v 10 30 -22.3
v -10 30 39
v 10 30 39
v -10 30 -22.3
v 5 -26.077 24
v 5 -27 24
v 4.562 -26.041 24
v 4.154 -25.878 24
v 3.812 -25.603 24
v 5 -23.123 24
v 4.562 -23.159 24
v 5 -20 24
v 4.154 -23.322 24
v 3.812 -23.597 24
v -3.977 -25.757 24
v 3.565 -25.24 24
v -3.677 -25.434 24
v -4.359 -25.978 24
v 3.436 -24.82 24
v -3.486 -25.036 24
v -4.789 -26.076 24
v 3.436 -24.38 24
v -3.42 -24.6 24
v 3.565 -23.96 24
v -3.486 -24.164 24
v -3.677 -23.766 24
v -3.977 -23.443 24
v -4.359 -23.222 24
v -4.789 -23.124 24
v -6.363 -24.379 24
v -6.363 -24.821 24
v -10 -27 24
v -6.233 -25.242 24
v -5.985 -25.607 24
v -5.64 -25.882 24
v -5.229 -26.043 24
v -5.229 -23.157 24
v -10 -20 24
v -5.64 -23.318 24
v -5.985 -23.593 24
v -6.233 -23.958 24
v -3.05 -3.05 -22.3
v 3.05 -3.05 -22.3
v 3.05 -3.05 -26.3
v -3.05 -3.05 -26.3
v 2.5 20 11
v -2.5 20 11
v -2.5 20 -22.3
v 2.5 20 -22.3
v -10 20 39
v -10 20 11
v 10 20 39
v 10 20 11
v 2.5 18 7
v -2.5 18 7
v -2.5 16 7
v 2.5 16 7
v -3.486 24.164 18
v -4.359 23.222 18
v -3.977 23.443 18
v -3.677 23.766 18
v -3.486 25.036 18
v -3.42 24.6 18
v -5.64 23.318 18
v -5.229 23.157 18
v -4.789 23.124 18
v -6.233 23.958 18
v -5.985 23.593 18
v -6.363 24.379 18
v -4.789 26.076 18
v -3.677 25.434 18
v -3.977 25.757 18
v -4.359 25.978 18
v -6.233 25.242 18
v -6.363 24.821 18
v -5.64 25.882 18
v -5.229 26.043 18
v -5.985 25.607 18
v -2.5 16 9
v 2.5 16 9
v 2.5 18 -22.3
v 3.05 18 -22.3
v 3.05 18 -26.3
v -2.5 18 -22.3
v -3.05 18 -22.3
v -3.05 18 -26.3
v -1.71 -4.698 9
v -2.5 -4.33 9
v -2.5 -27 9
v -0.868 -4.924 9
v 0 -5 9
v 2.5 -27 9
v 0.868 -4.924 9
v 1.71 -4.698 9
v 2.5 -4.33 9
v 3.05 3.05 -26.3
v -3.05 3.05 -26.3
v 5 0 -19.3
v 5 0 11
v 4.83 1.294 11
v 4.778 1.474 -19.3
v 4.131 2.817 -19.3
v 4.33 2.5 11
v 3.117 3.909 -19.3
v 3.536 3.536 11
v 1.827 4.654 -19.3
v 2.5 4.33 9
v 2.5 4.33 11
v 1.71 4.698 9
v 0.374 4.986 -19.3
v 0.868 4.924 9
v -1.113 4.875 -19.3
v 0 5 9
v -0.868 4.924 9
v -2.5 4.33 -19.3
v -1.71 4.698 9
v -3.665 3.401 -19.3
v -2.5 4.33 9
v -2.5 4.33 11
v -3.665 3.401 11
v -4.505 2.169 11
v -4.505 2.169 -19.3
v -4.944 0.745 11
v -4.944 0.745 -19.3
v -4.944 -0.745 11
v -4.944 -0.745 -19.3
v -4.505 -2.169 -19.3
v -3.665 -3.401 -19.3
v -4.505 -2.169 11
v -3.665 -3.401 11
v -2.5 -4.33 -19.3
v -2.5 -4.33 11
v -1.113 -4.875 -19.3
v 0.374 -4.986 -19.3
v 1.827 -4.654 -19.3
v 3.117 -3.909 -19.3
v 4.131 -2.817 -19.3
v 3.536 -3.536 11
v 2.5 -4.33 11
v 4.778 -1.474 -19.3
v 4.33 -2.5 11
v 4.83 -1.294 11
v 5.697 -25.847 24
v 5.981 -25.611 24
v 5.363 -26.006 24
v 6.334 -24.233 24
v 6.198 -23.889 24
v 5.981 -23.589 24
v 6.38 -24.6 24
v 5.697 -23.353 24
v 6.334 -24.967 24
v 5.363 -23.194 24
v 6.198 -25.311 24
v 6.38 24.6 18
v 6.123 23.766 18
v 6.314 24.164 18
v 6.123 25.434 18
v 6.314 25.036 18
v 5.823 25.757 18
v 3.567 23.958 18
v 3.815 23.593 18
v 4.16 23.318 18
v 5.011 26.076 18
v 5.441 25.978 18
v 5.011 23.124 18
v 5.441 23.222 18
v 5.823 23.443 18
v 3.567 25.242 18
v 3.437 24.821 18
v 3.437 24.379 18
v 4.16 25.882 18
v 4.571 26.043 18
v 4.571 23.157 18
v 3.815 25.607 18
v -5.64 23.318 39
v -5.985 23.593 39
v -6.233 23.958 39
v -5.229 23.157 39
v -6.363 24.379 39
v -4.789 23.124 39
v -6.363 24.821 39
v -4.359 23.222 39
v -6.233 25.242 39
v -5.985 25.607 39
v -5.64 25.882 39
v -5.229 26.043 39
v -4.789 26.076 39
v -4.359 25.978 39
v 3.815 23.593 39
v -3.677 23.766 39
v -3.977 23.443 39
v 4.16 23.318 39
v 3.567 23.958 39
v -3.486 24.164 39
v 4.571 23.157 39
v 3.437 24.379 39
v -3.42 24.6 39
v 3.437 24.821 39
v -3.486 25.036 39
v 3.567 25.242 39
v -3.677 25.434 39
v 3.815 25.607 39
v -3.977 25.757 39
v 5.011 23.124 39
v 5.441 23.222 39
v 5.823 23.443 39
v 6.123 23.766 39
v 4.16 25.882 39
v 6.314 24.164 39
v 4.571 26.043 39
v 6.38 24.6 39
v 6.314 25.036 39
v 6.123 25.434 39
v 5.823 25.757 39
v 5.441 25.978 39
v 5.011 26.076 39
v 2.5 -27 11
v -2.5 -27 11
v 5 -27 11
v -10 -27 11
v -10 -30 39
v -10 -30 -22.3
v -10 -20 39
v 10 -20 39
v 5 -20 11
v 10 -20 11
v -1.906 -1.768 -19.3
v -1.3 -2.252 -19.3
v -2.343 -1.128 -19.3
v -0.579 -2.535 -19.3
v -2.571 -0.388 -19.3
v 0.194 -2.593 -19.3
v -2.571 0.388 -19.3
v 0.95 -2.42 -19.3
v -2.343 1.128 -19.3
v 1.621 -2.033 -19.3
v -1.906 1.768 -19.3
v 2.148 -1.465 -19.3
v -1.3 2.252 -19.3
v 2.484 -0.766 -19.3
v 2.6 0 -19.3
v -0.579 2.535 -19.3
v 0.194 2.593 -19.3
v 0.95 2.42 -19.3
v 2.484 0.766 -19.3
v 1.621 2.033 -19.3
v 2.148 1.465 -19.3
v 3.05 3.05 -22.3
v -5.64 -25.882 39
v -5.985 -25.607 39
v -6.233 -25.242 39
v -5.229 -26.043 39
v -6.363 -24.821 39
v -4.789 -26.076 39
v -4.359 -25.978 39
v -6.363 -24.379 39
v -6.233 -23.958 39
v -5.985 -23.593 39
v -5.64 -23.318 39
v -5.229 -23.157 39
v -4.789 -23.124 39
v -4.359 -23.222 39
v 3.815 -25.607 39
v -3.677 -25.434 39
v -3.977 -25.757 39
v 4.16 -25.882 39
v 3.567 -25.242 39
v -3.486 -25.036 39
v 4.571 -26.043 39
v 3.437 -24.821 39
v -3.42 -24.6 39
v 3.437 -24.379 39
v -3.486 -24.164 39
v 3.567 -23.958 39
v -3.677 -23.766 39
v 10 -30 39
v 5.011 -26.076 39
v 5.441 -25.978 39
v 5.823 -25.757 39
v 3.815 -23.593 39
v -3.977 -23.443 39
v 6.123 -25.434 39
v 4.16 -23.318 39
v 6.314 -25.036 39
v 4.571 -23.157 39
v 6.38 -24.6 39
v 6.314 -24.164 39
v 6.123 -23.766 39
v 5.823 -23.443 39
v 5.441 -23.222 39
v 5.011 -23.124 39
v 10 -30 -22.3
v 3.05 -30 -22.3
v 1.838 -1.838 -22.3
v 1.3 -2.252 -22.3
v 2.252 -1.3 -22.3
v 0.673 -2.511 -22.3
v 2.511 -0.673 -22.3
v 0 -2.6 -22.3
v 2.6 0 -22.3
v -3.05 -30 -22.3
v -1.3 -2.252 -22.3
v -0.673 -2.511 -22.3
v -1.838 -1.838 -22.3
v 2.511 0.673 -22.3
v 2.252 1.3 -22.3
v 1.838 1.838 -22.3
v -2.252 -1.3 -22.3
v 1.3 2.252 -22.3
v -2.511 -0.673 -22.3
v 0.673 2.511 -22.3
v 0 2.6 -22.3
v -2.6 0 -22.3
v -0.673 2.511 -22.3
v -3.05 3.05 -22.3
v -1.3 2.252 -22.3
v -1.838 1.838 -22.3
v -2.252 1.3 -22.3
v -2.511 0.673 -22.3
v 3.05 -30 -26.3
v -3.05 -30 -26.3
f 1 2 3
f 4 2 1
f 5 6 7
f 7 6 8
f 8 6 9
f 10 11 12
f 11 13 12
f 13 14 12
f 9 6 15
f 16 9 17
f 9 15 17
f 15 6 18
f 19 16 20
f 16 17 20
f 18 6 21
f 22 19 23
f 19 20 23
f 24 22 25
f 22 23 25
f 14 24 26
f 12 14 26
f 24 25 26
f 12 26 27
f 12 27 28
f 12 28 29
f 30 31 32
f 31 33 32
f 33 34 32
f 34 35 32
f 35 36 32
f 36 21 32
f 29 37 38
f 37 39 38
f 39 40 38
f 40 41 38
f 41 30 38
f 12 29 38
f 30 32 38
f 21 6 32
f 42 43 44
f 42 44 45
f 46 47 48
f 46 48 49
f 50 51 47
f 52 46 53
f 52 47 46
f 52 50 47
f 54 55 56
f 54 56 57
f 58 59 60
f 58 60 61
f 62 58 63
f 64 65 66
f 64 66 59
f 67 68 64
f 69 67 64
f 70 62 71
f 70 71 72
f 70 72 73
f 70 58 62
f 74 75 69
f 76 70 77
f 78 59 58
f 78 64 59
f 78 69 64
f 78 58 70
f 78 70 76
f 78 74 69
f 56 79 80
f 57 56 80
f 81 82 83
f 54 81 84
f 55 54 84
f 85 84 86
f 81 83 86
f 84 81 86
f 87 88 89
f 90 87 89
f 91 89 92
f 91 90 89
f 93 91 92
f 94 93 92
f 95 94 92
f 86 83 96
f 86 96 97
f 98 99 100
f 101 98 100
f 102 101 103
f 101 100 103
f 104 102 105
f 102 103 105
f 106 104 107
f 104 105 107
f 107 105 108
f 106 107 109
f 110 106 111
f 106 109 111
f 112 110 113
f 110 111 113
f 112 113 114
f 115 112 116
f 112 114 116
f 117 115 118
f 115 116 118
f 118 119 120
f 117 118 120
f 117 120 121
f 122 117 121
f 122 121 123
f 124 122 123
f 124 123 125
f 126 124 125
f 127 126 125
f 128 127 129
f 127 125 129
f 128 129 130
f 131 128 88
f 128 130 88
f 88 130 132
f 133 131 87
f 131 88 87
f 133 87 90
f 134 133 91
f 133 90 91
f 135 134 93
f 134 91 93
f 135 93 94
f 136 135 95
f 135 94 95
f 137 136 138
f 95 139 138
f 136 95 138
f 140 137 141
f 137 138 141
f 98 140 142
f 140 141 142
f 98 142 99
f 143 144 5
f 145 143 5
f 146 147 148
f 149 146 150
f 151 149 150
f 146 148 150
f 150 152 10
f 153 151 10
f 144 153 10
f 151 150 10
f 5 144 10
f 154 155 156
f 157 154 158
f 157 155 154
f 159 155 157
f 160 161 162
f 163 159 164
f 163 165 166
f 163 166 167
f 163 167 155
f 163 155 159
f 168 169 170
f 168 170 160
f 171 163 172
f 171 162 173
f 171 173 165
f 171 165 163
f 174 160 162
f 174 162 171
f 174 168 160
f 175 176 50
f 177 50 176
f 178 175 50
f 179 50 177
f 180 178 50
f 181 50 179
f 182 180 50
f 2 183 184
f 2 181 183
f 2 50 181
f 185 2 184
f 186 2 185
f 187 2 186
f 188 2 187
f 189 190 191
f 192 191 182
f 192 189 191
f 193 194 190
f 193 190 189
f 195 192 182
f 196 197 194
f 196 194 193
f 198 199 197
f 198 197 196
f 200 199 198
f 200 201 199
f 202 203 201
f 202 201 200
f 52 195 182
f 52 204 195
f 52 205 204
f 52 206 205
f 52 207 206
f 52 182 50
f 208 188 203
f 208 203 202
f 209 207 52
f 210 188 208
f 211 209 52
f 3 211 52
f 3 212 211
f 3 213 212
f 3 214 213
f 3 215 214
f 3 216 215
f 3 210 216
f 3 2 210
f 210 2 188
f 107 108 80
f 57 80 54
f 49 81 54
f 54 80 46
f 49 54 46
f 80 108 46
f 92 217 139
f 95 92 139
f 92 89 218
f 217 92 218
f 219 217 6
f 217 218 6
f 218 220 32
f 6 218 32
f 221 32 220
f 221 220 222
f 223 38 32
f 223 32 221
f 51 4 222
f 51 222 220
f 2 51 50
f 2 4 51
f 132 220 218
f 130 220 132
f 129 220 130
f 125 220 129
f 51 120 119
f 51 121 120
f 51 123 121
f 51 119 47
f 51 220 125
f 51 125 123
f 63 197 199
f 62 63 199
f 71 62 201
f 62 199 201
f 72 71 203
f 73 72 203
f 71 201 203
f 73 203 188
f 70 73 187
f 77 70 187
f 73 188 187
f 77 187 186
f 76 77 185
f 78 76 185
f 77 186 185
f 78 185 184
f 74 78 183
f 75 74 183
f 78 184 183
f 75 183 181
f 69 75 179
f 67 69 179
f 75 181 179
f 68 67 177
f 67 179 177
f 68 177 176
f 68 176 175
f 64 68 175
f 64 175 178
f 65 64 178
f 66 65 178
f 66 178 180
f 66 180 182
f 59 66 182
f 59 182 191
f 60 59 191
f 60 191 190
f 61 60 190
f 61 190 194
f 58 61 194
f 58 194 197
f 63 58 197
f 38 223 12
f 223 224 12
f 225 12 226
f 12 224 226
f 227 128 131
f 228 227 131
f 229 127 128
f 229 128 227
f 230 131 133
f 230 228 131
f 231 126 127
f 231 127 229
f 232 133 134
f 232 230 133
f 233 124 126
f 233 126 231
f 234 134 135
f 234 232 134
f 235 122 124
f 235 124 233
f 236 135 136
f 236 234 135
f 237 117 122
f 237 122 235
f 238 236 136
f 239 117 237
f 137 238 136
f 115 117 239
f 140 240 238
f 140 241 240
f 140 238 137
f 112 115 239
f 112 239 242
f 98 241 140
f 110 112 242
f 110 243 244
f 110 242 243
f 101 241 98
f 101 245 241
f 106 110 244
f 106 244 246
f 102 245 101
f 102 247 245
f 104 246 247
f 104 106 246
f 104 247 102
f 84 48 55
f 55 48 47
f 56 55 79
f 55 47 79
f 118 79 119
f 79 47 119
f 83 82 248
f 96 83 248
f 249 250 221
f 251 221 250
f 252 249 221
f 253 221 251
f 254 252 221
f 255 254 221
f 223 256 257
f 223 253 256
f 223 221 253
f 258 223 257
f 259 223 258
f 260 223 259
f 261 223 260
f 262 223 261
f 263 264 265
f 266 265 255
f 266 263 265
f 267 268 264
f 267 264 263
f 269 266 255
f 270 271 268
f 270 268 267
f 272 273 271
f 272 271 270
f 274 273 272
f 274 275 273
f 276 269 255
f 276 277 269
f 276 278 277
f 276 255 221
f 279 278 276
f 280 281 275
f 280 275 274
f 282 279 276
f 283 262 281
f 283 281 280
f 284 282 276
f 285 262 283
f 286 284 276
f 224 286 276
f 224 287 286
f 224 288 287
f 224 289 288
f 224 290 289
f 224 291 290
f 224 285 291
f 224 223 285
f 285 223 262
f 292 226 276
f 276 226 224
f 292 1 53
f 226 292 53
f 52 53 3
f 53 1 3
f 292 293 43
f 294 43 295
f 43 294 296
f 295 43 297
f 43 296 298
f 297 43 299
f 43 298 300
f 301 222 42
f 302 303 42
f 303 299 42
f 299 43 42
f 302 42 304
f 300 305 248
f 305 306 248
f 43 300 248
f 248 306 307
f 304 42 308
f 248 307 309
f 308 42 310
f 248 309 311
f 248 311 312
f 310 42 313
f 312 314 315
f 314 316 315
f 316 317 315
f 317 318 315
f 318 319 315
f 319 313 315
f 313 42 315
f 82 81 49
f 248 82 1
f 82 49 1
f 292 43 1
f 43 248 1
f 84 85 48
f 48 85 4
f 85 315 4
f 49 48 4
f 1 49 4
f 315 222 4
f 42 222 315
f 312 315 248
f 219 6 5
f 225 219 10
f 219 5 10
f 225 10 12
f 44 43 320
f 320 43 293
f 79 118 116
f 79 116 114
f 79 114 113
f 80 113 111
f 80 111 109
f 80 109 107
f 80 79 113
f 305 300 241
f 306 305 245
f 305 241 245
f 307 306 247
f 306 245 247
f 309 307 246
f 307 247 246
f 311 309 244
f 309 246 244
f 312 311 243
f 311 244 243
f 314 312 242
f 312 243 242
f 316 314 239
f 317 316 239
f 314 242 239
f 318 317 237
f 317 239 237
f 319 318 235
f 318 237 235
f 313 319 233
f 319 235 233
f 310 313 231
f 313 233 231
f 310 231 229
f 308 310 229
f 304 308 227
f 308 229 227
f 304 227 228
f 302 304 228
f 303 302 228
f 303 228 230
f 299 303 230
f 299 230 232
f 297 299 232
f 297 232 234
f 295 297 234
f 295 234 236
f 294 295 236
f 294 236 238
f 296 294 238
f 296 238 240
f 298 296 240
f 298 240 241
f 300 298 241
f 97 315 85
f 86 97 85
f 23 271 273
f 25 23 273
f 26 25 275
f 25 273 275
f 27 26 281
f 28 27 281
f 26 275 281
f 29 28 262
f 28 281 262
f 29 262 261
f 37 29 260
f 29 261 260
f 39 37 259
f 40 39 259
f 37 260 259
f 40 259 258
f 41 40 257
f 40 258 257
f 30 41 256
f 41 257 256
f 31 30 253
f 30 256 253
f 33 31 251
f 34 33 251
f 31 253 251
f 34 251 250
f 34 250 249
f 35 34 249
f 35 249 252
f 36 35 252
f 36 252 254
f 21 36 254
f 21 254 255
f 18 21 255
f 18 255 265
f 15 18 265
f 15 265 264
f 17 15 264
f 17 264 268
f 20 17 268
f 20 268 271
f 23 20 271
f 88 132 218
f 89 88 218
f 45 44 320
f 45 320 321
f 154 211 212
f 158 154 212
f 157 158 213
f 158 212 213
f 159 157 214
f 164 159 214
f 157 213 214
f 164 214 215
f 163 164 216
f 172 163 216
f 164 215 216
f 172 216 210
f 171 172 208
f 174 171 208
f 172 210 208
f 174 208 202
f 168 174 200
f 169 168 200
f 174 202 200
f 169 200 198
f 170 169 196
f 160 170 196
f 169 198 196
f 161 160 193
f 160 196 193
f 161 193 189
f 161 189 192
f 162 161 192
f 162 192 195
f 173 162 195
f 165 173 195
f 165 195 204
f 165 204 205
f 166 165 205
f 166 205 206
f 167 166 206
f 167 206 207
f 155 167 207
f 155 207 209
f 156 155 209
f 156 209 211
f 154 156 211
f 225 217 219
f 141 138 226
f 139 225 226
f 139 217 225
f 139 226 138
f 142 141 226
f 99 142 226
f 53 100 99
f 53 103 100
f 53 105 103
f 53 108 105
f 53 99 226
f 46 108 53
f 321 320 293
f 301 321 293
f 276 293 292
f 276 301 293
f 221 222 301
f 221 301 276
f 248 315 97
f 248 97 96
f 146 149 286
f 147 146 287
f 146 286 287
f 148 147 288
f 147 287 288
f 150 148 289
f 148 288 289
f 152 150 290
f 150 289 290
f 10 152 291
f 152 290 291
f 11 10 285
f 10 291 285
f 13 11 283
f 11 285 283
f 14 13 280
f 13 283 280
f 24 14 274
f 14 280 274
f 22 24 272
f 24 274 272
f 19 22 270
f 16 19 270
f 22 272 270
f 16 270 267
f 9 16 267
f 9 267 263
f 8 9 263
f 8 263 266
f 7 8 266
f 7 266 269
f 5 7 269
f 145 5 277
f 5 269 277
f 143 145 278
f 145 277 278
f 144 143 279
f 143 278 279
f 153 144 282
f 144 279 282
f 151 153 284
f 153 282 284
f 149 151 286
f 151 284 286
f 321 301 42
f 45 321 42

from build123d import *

# Parameters (mm, degrees)
EXTRUDE_1_DEPTH      = 14
CUT_EXTRUDE_1_DEPTH  = 44
SKETCH_3_W           = 6.2
SKETCH_3_H           = 6.2
CUT_EXTRUDE_2_DEPTH  = 4
SKETCH_4_R           = 4
CUT_EXTRUDE_3_DEPTH  = 5
SKETCH_5_R           = 2.6
CUT_EXTRUDE_4_DEPTH  = 5
CUT_EXTRUDE_5_DEPTH  = 50
EXTRUDE_2_DEPTH      = 8
EXTRUDE_3_DEPTH      = 8
SKETCH_10_W          = 20
SKETCH_10_H          = 10
EXTRUDE_4_DEPTH      = 18
SKETCH_12_R          = 1.48
CUT_EXTRUDE_6_DEPTH  = 20
SKETCH_13_W          = 4
SKETCH_13_H          = 40
CUT_EXTRUDE_7_DEPTH  = 22
SKETCH_16_R          = 5
CUT_EXTRUDE_8_DEPTH  = 3
SKETCH_17_R          = 5
CUT_EXTRUDE_9_DEPTH  = 3
SKETCH_18_R          = 2.6
CUT_EXTRUDE_10_DEPTH = 99
SKETCH_19_R          = 5
EXTRUDE_5_DEPTH      = 6
SKETCH_20_W          = 6.2
SKETCH_20_H          = 6.2
CUT_EXTRUDE_11_DEPTH = 4
SKETCH_21_W          = 6.2
SKETCH_21_H          = 6.2
EXTRUDE_6_DEPTH      = 4
SKETCH_22_W          = 0.05
SKETCH_22_H          = 60
CUT_EXTRUDE_12_DEPTH = 4
EXTRUDE_START        = 6
SKETCH_25_W          = 20
SKETCH_25_H          = 10
SKETCH_25_R          = 1.48
EXTRUDE_7_DEPTH      = 6
CUT_EXTRUDE_13_DEPTH = 7
SKETCH_28_W          = 8
SKETCH_28_H          = 10
EXTRUDE_8_DEPTH      = 20
CUT_EXTRUDE_14_DEPTH = 7
SKETCH_30_W          = 6
SKETCH_30_H          = 2.9827115
SKETCH_30_H_2        = 3.265133333
EXTRUDE_9_DEPTH      = 7
SKETCH_31_W          = 6
SKETCH_31_H          = 2
EXTRUDE_10_DEPTH     = 10
SKETCH_32_W          = 6.1
SKETCH_32_H          = 3
CUT_EXTRUDE_15_DEPTH = 10
SKETCH_33_W          = 6.1
SKETCH_33_H          = 3
CUT_EXTRUDE_16_DEPTH = 4
SKETCH_34_W          = 10
SKETCH_34_H          = 5
CUT_EXTRUDE_17_DEPTH = 6
SKETCH_35_W          = 1
SKETCH_35_H          = 5
CUT_EXTRUDE_18_DEPTH = 14
SKETCH_36_W          = 6
SKETCH_36_H          = 5
EXTRUDE_11_DEPTH     = 6
SKETCH_37_W          = 8
SKETCH_37_H          = 1
CUT_EXTRUDE_19_DEPTH = 2
SKETCH_38_R          = 5
EXTRUDE_12_DEPTH     = 6
SKETCH_39_R          = 2.6
CUT_EXTRUDE_20_DEPTH = 10
SKETCH_40_R          = 5
CUT_EXTRUDE_21_DEPTH = 3
EXTRUDE_START_2      = 1
SKETCH_41_W          = 20
SKETCH_41_H          = 40
SKETCH_41_R          = 5
EXTRUDE_13_DEPTH     = 1
SKETCH_42_W          = 20
SKETCH_42_H          = 10
SKETCH_42_R          = 1.48
EXTRUDE_14_DEPTH     = 1
SKETCH_43_W          = 5
SKETCH_43_H          = 5
CUT_EXTRUDE_22_DEPTH = 15
EXTRUDE_15_DEPTH     = 2
SKETCH_45_W          = 6.1
SKETCH_45_H          = 18.1
EXTRUDE_16_DEPTH     = 10
CUT_EXTRUDE_START    = -4
CUT_EXTRUDE_23_DEPTH = 4
SKETCH_47_W          = 15
SKETCH_47_H          = 7.002427308
EXTRUDE_17_DEPTH     = 4
CUT_EXTRUDE_24_DEPTH = 1
SKETCH_49_W          = 2
SKETCH_49_H          = 1
CUT_EXTRUDE_27_DEPTH = 12.5
SKETCH_51_W          = 5
SKETCH_51_H          = 1
EXTRUDE_18_DEPTH     = 1
CUT_EXTRUDE_28_DEPTH = 5
EXTRUDE_19_DEPTH     = 7.5
SKETCH_54_W          = 6.95
SKETCH_54_H          = 2
CUT_EXTRUDE_29_DEPTH = 7.5
SKETCH_55_W          = 6.1
SKETCH_55_H          = 3
CUT_EXTRUDE_30_DEPTH = 4
SKETCH_56_W          = 0.55
SKETCH_56_H          = 0.142857143
EXTRUDE_20_DEPTH     = 4
SKETCH_60_W          = 26.3
SKETCH_60_H          = 60
EXTRUDE_21_DEPTH     = 20
EXTRUDE_22_DEPTH     = 4
SKETCH_62_R          = 2.6
CUT_EXTRUDE_31_DEPTH = 50
SKETCH_63_R          = 5
CUT_EXTRUDE_32_DEPTH = 30.3
CUT_EXTRUDE_33_DEPTH = 4
CUT_EXTRUDE_34_DEPTH = 2
SKETCH_66_W          = 5
SKETCH_66_H          = 2
CUT_EXTRUDE_35_DEPTH = 50
CUT_EXTRUDE_36_DEPTH = 4
SKETCH_68_W          = 5
SKETCH_68_H          = 2
CUT_EXTRUDE_37_DEPTH = 2


with BuildPart() as part:
    # 草图1 → 凸台-拉伸1 (new body)
    with BuildSketch(Plane.XY):
        Polygon((-15, 22), (-15, -22), (15, -22), (15, 22), (0, 22), align=None)
    extrude(amount=EXTRUDE_1_DEPTH)

    # 草图2 → 切除-拉伸1 (cut)
    with BuildSketch(Plane(origin=(0, 22, 0), x_dir=(1, 0, 0), z_dir=(0, 1, 0))):
        Polygon((-15, 0), (-15, -14), (-10, -4), (-3.1, -4), (-3.1, 0), align=None)
        Polygon((3.1, -4), (10, -4), (15, -14), (15, 0), (3.1, 0), align=None)
    extrude(amount=-CUT_EXTRUDE_1_DEPTH, mode=Mode.SUBTRACT)

    # 草图3 → 切除-拉伸2 (cut)
    with BuildSketch(Plane(origin=(0, 0, 0), x_dir=(-1, 0, 0), z_dir=(0, 0, -1))):
        Rectangle(SKETCH_3_W, SKETCH_3_H)
    extrude(amount=-CUT_EXTRUDE_2_DEPTH, mode=Mode.SUBTRACT)

    # 草图4 → 切除-拉伸3 (cut)
    with BuildSketch(Plane.XY.offset(14)):
        Circle(SKETCH_4_R)
    extrude(amount=-CUT_EXTRUDE_3_DEPTH, mode=Mode.SUBTRACT)

    # 草图5 → 切除-拉伸4 (cut)
    with BuildSketch(Plane.XY.offset(9)):
        Circle(SKETCH_5_R)
    extrude(amount=-CUT_EXTRUDE_4_DEPTH, mode=Mode.SUBTRACT)

    # 草图6 → 切除-拉伸5 (cut)
    with BuildSketch(Plane.XZ.offset(22)):
        Polygon((-10, 4), (-15, 14), (-10, 14), align=None)
        Polygon((10, 4), (10, 14), (15, 14), align=None)
    extrude(amount=-CUT_EXTRUDE_5_DEPTH, mode=Mode.SUBTRACT)

    # 草图8 → 凸台-拉伸2 (add)
    with BuildSketch(Plane(origin=(0, -22, 0), x_dir=(-1, 0, 0), z_dir=(0, -1, 0))):
        Polygon((10, -14), (-10, -14), (-10, -4), (-3.1, -4), (-3.1, 0), (3.1, 0), (3.1, -4), (10, -4), align=None)
    extrude(amount=EXTRUDE_2_DEPTH)

    # 草图9 → 凸台-拉伸3 (add)
    with BuildSketch(Plane(origin=(0, 22, 0), x_dir=(1, 0, 0), z_dir=(0, 1, 0))):
        Polygon((-3.1, -4), (-3.1, 0), (3.1, 0), (3.1, -4), (10, -4), (10, -14), (-10, -14), (-10, -4), align=None)
    extrude(amount=EXTRUDE_3_DEPTH)

    # 草图10 → 凸台-拉伸4 (add)
    with BuildSketch(Plane.XY.offset(14)):
        with Locations((0, 25)):
            Rectangle(SKETCH_10_W, SKETCH_10_H)
        with Locations((0, -25)):
            Rectangle(SKETCH_10_W, SKETCH_10_H)
    extrude(amount=EXTRUDE_4_DEPTH)

    # 草图12 → 切除-拉伸6 (cut)
    with BuildSketch(Plane.XY.offset(32)):
        with Locations((-4.9, -24.6)):
            Circle(SKETCH_12_R)
        with Locations((4.9, -24.6)):
            Circle(SKETCH_12_R)
        with Locations((-4.9, 24.6)):
            Circle(SKETCH_12_R)
        with Locations((4.9, 24.6)):
            Circle(SKETCH_12_R)
    extrude(amount=-CUT_EXTRUDE_6_DEPTH, mode=Mode.SUBTRACT)

    # 草图13 → 切除-拉伸7 (cut)
    with BuildSketch(Plane(origin=(10, 0, 0), x_dir=(0, 0, -1), z_dir=(1, 0, 0))):
        with Locations((-12, 0)):
            Rectangle(SKETCH_13_W, SKETCH_13_H)
    extrude(amount=-CUT_EXTRUDE_7_DEPTH, mode=Mode.SUBTRACT)

    # 草图16 → 切除-拉伸8 (cut)
    with BuildSketch(Plane.XY.offset(10)):
        Circle(SKETCH_16_R)
    extrude(amount=-CUT_EXTRUDE_8_DEPTH, mode=Mode.SUBTRACT)

    # 草图17 → 切除-拉伸9 (cut)
    with BuildSketch(Plane.XY.offset(10)):
        with Locations((0, 15)):
            Circle(SKETCH_17_R)
        with Locations((0, -15)):
            Circle(SKETCH_17_R)
    extrude(amount=-CUT_EXTRUDE_9_DEPTH, mode=Mode.SUBTRACT)

    # 草图18 → 切除-拉伸10 (cut)
    with BuildSketch(Plane.XY.offset(7)):
        with Locations((0, 15)):
            Circle(SKETCH_18_R)
        with Locations((0, -15)):
            Circle(SKETCH_18_R)
    extrude(amount=-CUT_EXTRUDE_10_DEPTH, mode=Mode.SUBTRACT)

    # 草图19 → 凸台-拉伸5 (add)
    with BuildSketch(Plane.XY.offset(10)):
        Circle(SKETCH_19_R)
    extrude(amount=-EXTRUDE_5_DEPTH)

    # 草图20 → 切除-拉伸11 (cut)
    with BuildSketch(Plane(origin=(0, 0, 0), x_dir=(-1, 0, 0), z_dir=(0, 0, -1))):
        Polygon((0, -11.9), (0, -15), (0, -18.1), (3.1, -18.1), (3.1, -11.9), align=None)
        Polygon((0, -18.1), (0, -15), (0, -11.9), (-3.1, -11.9), (-3.1, -18.1), align=None)
        with Locations((0, 15)):
            Rectangle(SKETCH_20_W, SKETCH_20_H)
    extrude(amount=-CUT_EXTRUDE_11_DEPTH, mode=Mode.SUBTRACT)

    # 草图21 → 凸台-拉伸6 (add)
    with BuildSketch(Plane(origin=(0, 0, 0), x_dir=(-1, 0, 0), z_dir=(0, 0, -1))):
        Rectangle(SKETCH_21_W, SKETCH_21_H)
    extrude(amount=-EXTRUDE_6_DEPTH)

    # 草图22 → 切除-拉伸12 (cut)
    with BuildSketch(Plane(origin=(0, 0, 0), x_dir=(-1, 0, 0), z_dir=(0, 0, -1))):
        with Locations((-3.075, 0)):
            Rectangle(SKETCH_22_W, SKETCH_22_H)
        with Locations((3.075, 0)):
            Rectangle(SKETCH_22_W, SKETCH_22_H)
    extrude(amount=-CUT_EXTRUDE_12_DEPTH, mode=Mode.SUBTRACT)

    # 草图25 → 凸台-拉伸7 (add)
    # profile 1 of 2: a face of its own
    with BuildSketch(Plane.XY.offset(32).offset(EXTRUDE_START)):
        with Locations((0, 25)):
            Rectangle(SKETCH_25_W, SKETCH_25_H)
        with Locations((-4.9, 24.6)):
            Circle(SKETCH_25_R, mode=Mode.SUBTRACT)
        with Locations((4.9, 24.6)):
            Circle(SKETCH_25_R, mode=Mode.SUBTRACT)
    # profile 2 of 2: a face of its own
    with BuildSketch(Plane.XY.offset(32).offset(EXTRUDE_START)):
        with Locations((0, -25)):
            Rectangle(SKETCH_25_W, SKETCH_25_H)
        with Locations((-4.9, -24.6)):
            Circle(SKETCH_25_R, mode=Mode.SUBTRACT)
        with Locations((4.9, -24.6)):
            Circle(SKETCH_25_R, mode=Mode.SUBTRACT)
    extrude(amount=-EXTRUDE_7_DEPTH)

    # 草图27 → 切除-拉伸13 (cut)
    with BuildSketch(Plane(origin=(0, -20, 0), x_dir=(1, 0, 0), z_dir=(0, 1, 0))):
        Polygon((4, -15), (4, -10), (0, -10), (-4, -10), (-4, -15), align=None)
    extrude(amount=-CUT_EXTRUDE_13_DEPTH, mode=Mode.SUBTRACT)

    # 草图28 → 凸台-拉伸8 (add)
    with BuildSketch(Plane.ZY.offset(10)):
        with Locations((14, -25)):
            Rectangle(SKETCH_28_W, SKETCH_28_H)
        with Locations((14, 25)):
            Rectangle(SKETCH_28_W, SKETCH_28_H)
    extrude(amount=-EXTRUDE_8_DEPTH)

    # 草图29 → 切除-拉伸14 (cut)
    with BuildSketch(Plane(origin=(0, -20, 0), x_dir=(1, 0, 0), z_dir=(0, 1, 0))):
        Polygon((4, -20), (4, -10), (0, -10), (-4, -10), (-4, -20), align=None)
    extrude(amount=-CUT_EXTRUDE_14_DEPTH, mode=Mode.SUBTRACT)

    # 草图30 → 凸台-拉伸9 (add)
    with BuildSketch(Plane(origin=(0, -20, 0), x_dir=(1, 0, 0), z_dir=(0, 1, 0))):
        with Locations((-7, -18.50864425)):
            Rectangle(SKETCH_30_W, SKETCH_30_H)
        with Locations((7, -18.367433334)):
            Rectangle(SKETCH_30_W, SKETCH_30_H_2)
    extrude(amount=-EXTRUDE_9_DEPTH)

    # 草图31 → 凸台-拉伸10 (add)
    with BuildSketch(Plane(origin=(0, -20, 0), x_dir=(1, 0, 0), z_dir=(0, 1, 0))):
        with Locations((7, -21)):
            Rectangle(SKETCH_31_W, SKETCH_31_H)
        Polygon((4, -22), (4, -20), (-4, -20), (-10, -20), (-10, -22), align=None)
    extrude(amount=-EXTRUDE_10_DEPTH)

    # 草图32 → 切除-拉伸15 (cut)
    with BuildSketch(Plane(origin=(0, 0, 0), x_dir=(-1, 0, 0), z_dir=(0, 0, -1))):
        with Locations((0, -25.5)):
            Rectangle(SKETCH_32_W, SKETCH_32_H)
    extrude(amount=-CUT_EXTRUDE_15_DEPTH, mode=Mode.SUBTRACT)

    # 草图33 → 切除-拉伸16 (cut)
    with BuildSketch(Plane(origin=(0, 0, 0), x_dir=(-1, 0, 0), z_dir=(0, 0, -1))):
        with Locations((0, -28.5)):
            Rectangle(SKETCH_33_W, SKETCH_33_H)
    extrude(amount=-CUT_EXTRUDE_16_DEPTH, mode=Mode.SUBTRACT)

    # 草图34 → 切除-拉伸17 (cut)
    with BuildSketch(Plane.ZY.offset(10)):
        with Locations((15, -22.5)):
            Rectangle(SKETCH_34_W, SKETCH_34_H)
    extrude(amount=-CUT_EXTRUDE_17_DEPTH, mode=Mode.SUBTRACT)

    # 草图35 → 切除-拉伸18 (cut)
    with BuildSketch(Plane.ZY.offset(10)):
        with Locations((20.5, -22.5)):
            Rectangle(SKETCH_35_W, SKETCH_35_H)
    extrude(amount=-CUT_EXTRUDE_18_DEPTH, mode=Mode.SUBTRACT)

    # 草图36 → 凸台-拉伸11 (add)
    with BuildSketch(Plane.ZY.offset(10)):
        with Locations((13, -22.5)):
            Rectangle(SKETCH_36_W, SKETCH_36_H)
    extrude(amount=-EXTRUDE_11_DEPTH)

    # 草图37 → 切除-拉伸19 (cut)
    with BuildSketch(Plane(origin=(0, -25, 0), x_dir=(1, 0, 0), z_dir=(0, 1, 0))):
        with Locations((0, -20.5)):
            Rectangle(SKETCH_37_W, SKETCH_37_H)
    extrude(amount=-CUT_EXTRUDE_19_DEPTH, mode=Mode.SUBTRACT)

    # 草图38 → 凸台-拉伸12 (add)
    with BuildSketch(Plane.XY.offset(10)):
        with Locations((0, 15)):
            Circle(SKETCH_38_R)
        with Locations((0, -15)):
            Circle(SKETCH_38_R)
    extrude(amount=-EXTRUDE_12_DEPTH)

    # 草图39 → 切除-拉伸20 (cut)
    with BuildSketch(Plane.XY.offset(10)):
        Circle(SKETCH_39_R)
    extrude(amount=-CUT_EXTRUDE_20_DEPTH, mode=Mode.SUBTRACT)

    # 草图40 → 切除-拉伸21 (cut)
    with BuildSketch(Plane.XY.offset(10)):
        Circle(SKETCH_40_R)
    extrude(amount=-CUT_EXTRUDE_21_DEPTH, mode=Mode.SUBTRACT)

    # 草图41 → 凸台-拉伸13 (add)
    with BuildSketch(Plane.XY.offset(10).offset(EXTRUDE_START_2)):
        Rectangle(SKETCH_41_W, SKETCH_41_H)
        Circle(SKETCH_41_R, mode=Mode.SUBTRACT)
    extrude(amount=-EXTRUDE_13_DEPTH)

    # 草图42 → 凸台-拉伸14 (add)
    # profile 1 of 2: a face of its own
    with BuildSketch(Plane.XY.offset(38).offset(EXTRUDE_START_2)):
        with Locations((0, 25)):
            Rectangle(SKETCH_42_W, SKETCH_42_H)
        with Locations((-4.9, 24.6)):
            Circle(SKETCH_42_R, mode=Mode.SUBTRACT)
        with Locations((4.9, 24.6)):
            Circle(SKETCH_42_R, mode=Mode.SUBTRACT)
    # profile 2 of 2: a face of its own
    with BuildSketch(Plane.XY.offset(38).offset(EXTRUDE_START_2)):
        with Locations((0, -25)):
            Rectangle(SKETCH_42_W, SKETCH_42_H)
        with Locations((-4.9, -24.6)):
            Circle(SKETCH_42_R, mode=Mode.SUBTRACT)
        with Locations((4.9, -24.6)):
            Circle(SKETCH_42_R, mode=Mode.SUBTRACT)
    extrude(amount=-EXTRUDE_14_DEPTH)

    # 草图43 → 切除-拉伸22 (cut)
    with BuildSketch(Plane.ZY.offset(10)):
        Polygon((24, -27), (24, -20), (21, -20), (21, -25), (16, -25), (16, -20), (11, -20), (10.997708979, -20), (10.997708979, -27), align=None)
        with Locations((18.5, -22.5)):
            Rectangle(SKETCH_43_W, SKETCH_43_H)
    extrude(amount=-CUT_EXTRUDE_22_DEPTH, mode=Mode.SUBTRACT)

    # 草图44 → 凸台-拉伸15 (add)
    with BuildSketch(Plane(origin=(0, 0, 24), x_dir=(-1, 0, 0), z_dir=(0, 0, -1))):
        with BuildLine():
            Line((-5, -26.076617757), (-5, -23.123382243))
            ThreePointArc((-5, -23.123382243), (-6.38, -24.6), (-5, -26.076617757))
        make_face()
    extrude(amount=EXTRUDE_15_DEPTH)

    # 草图45 → 凸台-拉伸16 (add)
    with BuildSketch(Plane(origin=(0, 0, 0), x_dir=(-1, 0, 0), z_dir=(0, 0, -1))):
        with Locations((0, -20.95)):
            Rectangle(SKETCH_45_W, SKETCH_45_H)
        with Locations((0, 20.95)):
            Rectangle(SKETCH_45_W, SKETCH_45_H)
    extrude(amount=-EXTRUDE_16_DEPTH)

    # 草图46 → 切除-拉伸23 (cut)
    with BuildSketch(Plane(origin=(0, 0, 0), x_dir=(-1, 0, 0), z_dir=(0, 0, -1)).offset(CUT_EXTRUDE_START)):
        with BuildLine():
            Line((0, -2.6), (0, 0))
            Line((0, 0), (0, 2.6))
            ThreePointArc((0, 2.6), (-2.6, 0), (0, -2.6))
        make_face()
        with BuildLine():
            Line((0, 2.6), (0, 0))
            Line((0, 0), (0, -2.6))
            ThreePointArc((0, -2.6), (1.838477631, -1.838477631), (2.6, 0))
            ThreePointArc((2.6, 0), (1.838477631, 1.838477631), (0, 2.6))
        make_face()
        with BuildLine():
            ThreePointArc((0, -2.6), (-2.6, 0), (0, 2.6))
            Line((0, 2.6), (0, 3.05))
            Line((0, 3.05), (-3.05, 3.05))
            Line((-3.05, 3.05), (-3.05, -3.05))
            Line((-3.05, -3.05), (0, -3.05))
            Line((0, -3.05), (0, -2.6))
        make_face()
        with BuildLine():
            Line((0, 3.05), (0, 2.6))
            ThreePointArc((0, 2.6), (1.838477631, 1.838477631), (2.6, 0))
            ThreePointArc((2.6, 0), (1.838477631, -1.838477631), (0, -2.6))
            Line((0, -2.6), (0, -3.05))
            Line((0, -3.05), (3.05, -3.05))
            Line((3.05, -3.05), (3.05, 3.05))
            Line((3.05, 3.05), (0, 3.05))
        make_face()
    extrude(amount=CUT_EXTRUDE_23_DEPTH, mode=Mode.SUBTRACT)

    # 草图47 → 凸台-拉伸17 (add)
    with BuildSketch(Plane.XY.offset(11)):
        with Locations((-2.5, -23.501213654)):
            Rectangle(SKETCH_47_W, SKETCH_47_H)
    extrude(amount=-EXTRUDE_17_DEPTH)

    # 草图48 → 切除-拉伸24 (cut)
    with BuildSketch(Plane.XY.offset(11)):
        with BuildLine():
            Line((-2.5, 20), (-2.5, 4.330127019))
            ThreePointArc((-2.5, 4.330127019), (0, 5), (2.5, 4.330127019))
            Line((2.5, 4.330127019), (2.5, 20))
            Line((2.5, 20), (-2.5, 20))
        make_face()
        with BuildLine():
            Line((-2.5, -27), (0, -27))
            Line((0, -27), (2.5, -27))
            Line((2.5, -27), (2.5, -4.330127019))
            ThreePointArc((2.5, -4.330127019), (0, -5), (-2.5, -4.330127019))
            Line((-2.5, -4.330127019), (-2.5, -27))
        make_face()
    extrude(amount=-CUT_EXTRUDE_24_DEPTH, mode=Mode.SUBTRACT)

    # 草图49 → 切除-拉伸27 (cut)
    with BuildSketch(Plane.ZY.offset(10)):
        with Locations((10, 19.5)):
            Rectangle(SKETCH_49_W, SKETCH_49_H)
        Polygon((9, 20), (11, 20), (4, 30), (4, 27.142857143), align=None)
        Polygon((4, 27.142857143), (4, 30), (4, 31.546618197), (2, 31.546618197), (2, 30), align=None)
    extrude(amount=-CUT_EXTRUDE_27_DEPTH, mode=Mode.SUBTRACT)

    # 草图51 → 凸台-拉伸18 (add)
    with BuildSketch(Plane(origin=(0, 19, 0), x_dir=(1, 0, 0), z_dir=(0, 1, 0))):
        with Locations((0, -9.5)):
            Rectangle(SKETCH_51_W, SKETCH_51_H)
    extrude(amount=EXTRUDE_18_DEPTH)

    # 草图52 → 切除-拉伸28 (cut)
    with BuildSketch(Plane.ZY.offset(2.5)):
        Polygon((9, 20), (10, 19), (10, 20), align=None)
    extrude(amount=-CUT_EXTRUDE_28_DEPTH, mode=Mode.SUBTRACT)

    # 草图53 → 凸台-拉伸19 (add)
    with BuildSketch(Plane.ZY.offset(10)):
        Polygon((11, 20), (4, 30), (2, 30), (9, 20), (9, 19), (11, 19), align=None)
    extrude(amount=-EXTRUDE_19_DEPTH)

    # 草图54 → 切除-拉伸29 (cut)
    with BuildSketch(Plane(origin=(0, 30, 0), x_dir=(1, 0, 0), z_dir=(0, 1, 0))):
        with Locations((-6.525, -3)):
            Rectangle(SKETCH_54_W, SKETCH_54_H)
    extrude(amount=-CUT_EXTRUDE_29_DEPTH, mode=Mode.SUBTRACT)

    # 草图55 → 切除-拉伸30 (cut)
    with BuildSketch(Plane(origin=(0, 0, 0), x_dir=(-1, 0, 0), z_dir=(0, 0, -1))):
        with Locations((0, 28.5)):
            Rectangle(SKETCH_55_W, SKETCH_55_H)
    extrude(amount=-CUT_EXTRUDE_30_DEPTH, mode=Mode.SUBTRACT)

    # 草图56 → 凸台-拉伸20 (add)
    with BuildSketch(Plane(origin=(0, 0, 4), x_dir=(-1, 0, 0), z_dir=(0, 0, -1))):
        with Locations((-2.775, 27.071428572)):
            Rectangle(SKETCH_56_W, SKETCH_56_H)
        Polygon((2.5, 27.142857143), (-2.5, 27.142857143), (-2.5, 27), (3.05, 27), (3.05, 27.142857143), align=None)
    extrude(amount=EXTRUDE_20_DEPTH)

    # 草图60 → 凸台-拉伸21 (add)
    with BuildSketch(Plane.ZY.offset(10)):
        with Locations((-9.15, 0)):
            Rectangle(SKETCH_60_W, SKETCH_60_H)
        Polygon((11, -27), (11, 20), (11, 30), (4, 30), (4, -30), (11, -30), align=None)
    extrude(amount=-EXTRUDE_21_DEPTH)

    # 草图61 → 凸台-拉伸22 (add)
    with BuildSketch(Plane(origin=(0, 0, -22.3), x_dir=(-1, 0, 0), z_dir=(0, 0, -1))):
        Polygon((0, -30), (0, 0), (0, 30), (-3.05, 30), (-3.05, -30), align=None)
        Polygon((0, 30), (0, 0), (0, -30), (3.05, -30), (3.05, 30), align=None)
    extrude(amount=EXTRUDE_22_DEPTH)

    # 草图62 → 切除-拉伸31 (cut)
    with BuildSketch(Plane.XY.offset(11)):
        Circle(SKETCH_62_R)
    extrude(amount=-CUT_EXTRUDE_31_DEPTH, mode=Mode.SUBTRACT)

    # 草图63 → 切除-拉伸32 (cut)
    with BuildSketch(Plane.XY.offset(11)):
        Circle(SKETCH_63_R)
    extrude(amount=-CUT_EXTRUDE_32_DEPTH, mode=Mode.SUBTRACT)

    # 草图64 → 切除-拉伸33 (cut)
    with BuildSketch(Plane(origin=(0, 0, -26.3), x_dir=(-1, 0, 0), z_dir=(0, 0, -1)).offset(CUT_EXTRUDE_START)):
        with BuildLine():
            Line((0, 3.05), (0, 2.6))
            ThreePointArc((0, 2.6), (1.838477631, 1.838477631), (2.6, 0))
            ThreePointArc((2.6, 0), (1.838477631, -1.838477631), (0, -2.6))
            Line((0, -2.6), (0, -3.05))
            Line((0, -3.05), (3.05, -3.05))
            Line((3.05, -3.05), (3.05, 3.05))
            Line((3.05, 3.05), (0, 3.05))
        make_face()
        with BuildLine():
            ThreePointArc((0, -2.6), (-2.6, 0), (0, 2.6))
            Line((0, 2.6), (0, 3.05))
            Line((0, 3.05), (-3.05, 3.05))
            Line((-3.05, 3.05), (-3.05, -3.05))
            Line((-3.05, -3.05), (0, -3.05))
            Line((0, -3.05), (0, -2.6))
        make_face()
    extrude(amount=CUT_EXTRUDE_33_DEPTH, mode=Mode.SUBTRACT)

    # 草图65 → 切除-拉伸34 (cut)
    with BuildSketch(Plane.XY.offset(11)):
        with BuildLine():
            Line((0, 20), (0, 5))
            ThreePointArc((0, 5), (1.294095226, 4.829629131), (2.5, 4.330127019))
            Line((2.5, 4.330127019), (2.5, 20))
            Line((2.5, 20), (0, 20))
        make_face()
        with BuildLine():
            ThreePointArc((-2.5, 4.330127019), (-1.294095226, 4.829629131), (0, 5))
            Line((0, 5), (0, 20))
            Line((0, 20), (-2.5, 20))
            Line((-2.5, 20), (-2.5, 4.330127019))
        make_face()
        with BuildLine():
            ThreePointArc((2.5, -4.330127019), (1.294095226, -4.829629131), (0, -5))
            Line((0, -5), (0, -27))
            Line((0, -27), (2.5, -27))
            Line((2.5, -27), (2.5, -4.330127019))
        make_face()
        with BuildLine():
            Line((0, -27), (0, -5))
            ThreePointArc((0, -5), (-1.294095226, -4.829629131), (-2.5, -4.330127019))
            Line((-2.5, -4.330127019), (-2.5, -27))
            Line((-2.5, -27), (0, -27))
        make_face()
    extrude(amount=-CUT_EXTRUDE_34_DEPTH, mode=Mode.SUBTRACT)

    # 草图66 → 切除-拉伸35 (cut)
    with BuildSketch(Plane.XY.offset(9)):
        with Locations((0, 19)):
            Rectangle(SKETCH_66_W, SKETCH_66_H)
    extrude(amount=-CUT_EXTRUDE_35_DEPTH, mode=Mode.SUBTRACT)

    # 草图67 → 切除-拉伸36 (cut)
    with BuildSketch(Plane(origin=(0, 0, -26.3), x_dir=(-1, 0, 0), z_dir=(0, 0, -1))):
        Polygon((2.5, 20), (2.5, 18), (3.05, 18), (3.05, 30), (-3.05, 30), (-3.05, 18), (-2.5, 18), (-2.5, 20), align=None)
    extrude(amount=-CUT_EXTRUDE_36_DEPTH, mode=Mode.SUBTRACT)

    # 草图68 → 切除-拉伸37 (cut)
    with BuildSketch(Plane.XY.offset(9)):
        with Locations((0, 17)):
            Rectangle(SKETCH_68_W, SKETCH_68_H)
    extrude(amount=-CUT_EXTRUDE_37_DEPTH, mode=Mode.SUBTRACT)


solid = part.part
